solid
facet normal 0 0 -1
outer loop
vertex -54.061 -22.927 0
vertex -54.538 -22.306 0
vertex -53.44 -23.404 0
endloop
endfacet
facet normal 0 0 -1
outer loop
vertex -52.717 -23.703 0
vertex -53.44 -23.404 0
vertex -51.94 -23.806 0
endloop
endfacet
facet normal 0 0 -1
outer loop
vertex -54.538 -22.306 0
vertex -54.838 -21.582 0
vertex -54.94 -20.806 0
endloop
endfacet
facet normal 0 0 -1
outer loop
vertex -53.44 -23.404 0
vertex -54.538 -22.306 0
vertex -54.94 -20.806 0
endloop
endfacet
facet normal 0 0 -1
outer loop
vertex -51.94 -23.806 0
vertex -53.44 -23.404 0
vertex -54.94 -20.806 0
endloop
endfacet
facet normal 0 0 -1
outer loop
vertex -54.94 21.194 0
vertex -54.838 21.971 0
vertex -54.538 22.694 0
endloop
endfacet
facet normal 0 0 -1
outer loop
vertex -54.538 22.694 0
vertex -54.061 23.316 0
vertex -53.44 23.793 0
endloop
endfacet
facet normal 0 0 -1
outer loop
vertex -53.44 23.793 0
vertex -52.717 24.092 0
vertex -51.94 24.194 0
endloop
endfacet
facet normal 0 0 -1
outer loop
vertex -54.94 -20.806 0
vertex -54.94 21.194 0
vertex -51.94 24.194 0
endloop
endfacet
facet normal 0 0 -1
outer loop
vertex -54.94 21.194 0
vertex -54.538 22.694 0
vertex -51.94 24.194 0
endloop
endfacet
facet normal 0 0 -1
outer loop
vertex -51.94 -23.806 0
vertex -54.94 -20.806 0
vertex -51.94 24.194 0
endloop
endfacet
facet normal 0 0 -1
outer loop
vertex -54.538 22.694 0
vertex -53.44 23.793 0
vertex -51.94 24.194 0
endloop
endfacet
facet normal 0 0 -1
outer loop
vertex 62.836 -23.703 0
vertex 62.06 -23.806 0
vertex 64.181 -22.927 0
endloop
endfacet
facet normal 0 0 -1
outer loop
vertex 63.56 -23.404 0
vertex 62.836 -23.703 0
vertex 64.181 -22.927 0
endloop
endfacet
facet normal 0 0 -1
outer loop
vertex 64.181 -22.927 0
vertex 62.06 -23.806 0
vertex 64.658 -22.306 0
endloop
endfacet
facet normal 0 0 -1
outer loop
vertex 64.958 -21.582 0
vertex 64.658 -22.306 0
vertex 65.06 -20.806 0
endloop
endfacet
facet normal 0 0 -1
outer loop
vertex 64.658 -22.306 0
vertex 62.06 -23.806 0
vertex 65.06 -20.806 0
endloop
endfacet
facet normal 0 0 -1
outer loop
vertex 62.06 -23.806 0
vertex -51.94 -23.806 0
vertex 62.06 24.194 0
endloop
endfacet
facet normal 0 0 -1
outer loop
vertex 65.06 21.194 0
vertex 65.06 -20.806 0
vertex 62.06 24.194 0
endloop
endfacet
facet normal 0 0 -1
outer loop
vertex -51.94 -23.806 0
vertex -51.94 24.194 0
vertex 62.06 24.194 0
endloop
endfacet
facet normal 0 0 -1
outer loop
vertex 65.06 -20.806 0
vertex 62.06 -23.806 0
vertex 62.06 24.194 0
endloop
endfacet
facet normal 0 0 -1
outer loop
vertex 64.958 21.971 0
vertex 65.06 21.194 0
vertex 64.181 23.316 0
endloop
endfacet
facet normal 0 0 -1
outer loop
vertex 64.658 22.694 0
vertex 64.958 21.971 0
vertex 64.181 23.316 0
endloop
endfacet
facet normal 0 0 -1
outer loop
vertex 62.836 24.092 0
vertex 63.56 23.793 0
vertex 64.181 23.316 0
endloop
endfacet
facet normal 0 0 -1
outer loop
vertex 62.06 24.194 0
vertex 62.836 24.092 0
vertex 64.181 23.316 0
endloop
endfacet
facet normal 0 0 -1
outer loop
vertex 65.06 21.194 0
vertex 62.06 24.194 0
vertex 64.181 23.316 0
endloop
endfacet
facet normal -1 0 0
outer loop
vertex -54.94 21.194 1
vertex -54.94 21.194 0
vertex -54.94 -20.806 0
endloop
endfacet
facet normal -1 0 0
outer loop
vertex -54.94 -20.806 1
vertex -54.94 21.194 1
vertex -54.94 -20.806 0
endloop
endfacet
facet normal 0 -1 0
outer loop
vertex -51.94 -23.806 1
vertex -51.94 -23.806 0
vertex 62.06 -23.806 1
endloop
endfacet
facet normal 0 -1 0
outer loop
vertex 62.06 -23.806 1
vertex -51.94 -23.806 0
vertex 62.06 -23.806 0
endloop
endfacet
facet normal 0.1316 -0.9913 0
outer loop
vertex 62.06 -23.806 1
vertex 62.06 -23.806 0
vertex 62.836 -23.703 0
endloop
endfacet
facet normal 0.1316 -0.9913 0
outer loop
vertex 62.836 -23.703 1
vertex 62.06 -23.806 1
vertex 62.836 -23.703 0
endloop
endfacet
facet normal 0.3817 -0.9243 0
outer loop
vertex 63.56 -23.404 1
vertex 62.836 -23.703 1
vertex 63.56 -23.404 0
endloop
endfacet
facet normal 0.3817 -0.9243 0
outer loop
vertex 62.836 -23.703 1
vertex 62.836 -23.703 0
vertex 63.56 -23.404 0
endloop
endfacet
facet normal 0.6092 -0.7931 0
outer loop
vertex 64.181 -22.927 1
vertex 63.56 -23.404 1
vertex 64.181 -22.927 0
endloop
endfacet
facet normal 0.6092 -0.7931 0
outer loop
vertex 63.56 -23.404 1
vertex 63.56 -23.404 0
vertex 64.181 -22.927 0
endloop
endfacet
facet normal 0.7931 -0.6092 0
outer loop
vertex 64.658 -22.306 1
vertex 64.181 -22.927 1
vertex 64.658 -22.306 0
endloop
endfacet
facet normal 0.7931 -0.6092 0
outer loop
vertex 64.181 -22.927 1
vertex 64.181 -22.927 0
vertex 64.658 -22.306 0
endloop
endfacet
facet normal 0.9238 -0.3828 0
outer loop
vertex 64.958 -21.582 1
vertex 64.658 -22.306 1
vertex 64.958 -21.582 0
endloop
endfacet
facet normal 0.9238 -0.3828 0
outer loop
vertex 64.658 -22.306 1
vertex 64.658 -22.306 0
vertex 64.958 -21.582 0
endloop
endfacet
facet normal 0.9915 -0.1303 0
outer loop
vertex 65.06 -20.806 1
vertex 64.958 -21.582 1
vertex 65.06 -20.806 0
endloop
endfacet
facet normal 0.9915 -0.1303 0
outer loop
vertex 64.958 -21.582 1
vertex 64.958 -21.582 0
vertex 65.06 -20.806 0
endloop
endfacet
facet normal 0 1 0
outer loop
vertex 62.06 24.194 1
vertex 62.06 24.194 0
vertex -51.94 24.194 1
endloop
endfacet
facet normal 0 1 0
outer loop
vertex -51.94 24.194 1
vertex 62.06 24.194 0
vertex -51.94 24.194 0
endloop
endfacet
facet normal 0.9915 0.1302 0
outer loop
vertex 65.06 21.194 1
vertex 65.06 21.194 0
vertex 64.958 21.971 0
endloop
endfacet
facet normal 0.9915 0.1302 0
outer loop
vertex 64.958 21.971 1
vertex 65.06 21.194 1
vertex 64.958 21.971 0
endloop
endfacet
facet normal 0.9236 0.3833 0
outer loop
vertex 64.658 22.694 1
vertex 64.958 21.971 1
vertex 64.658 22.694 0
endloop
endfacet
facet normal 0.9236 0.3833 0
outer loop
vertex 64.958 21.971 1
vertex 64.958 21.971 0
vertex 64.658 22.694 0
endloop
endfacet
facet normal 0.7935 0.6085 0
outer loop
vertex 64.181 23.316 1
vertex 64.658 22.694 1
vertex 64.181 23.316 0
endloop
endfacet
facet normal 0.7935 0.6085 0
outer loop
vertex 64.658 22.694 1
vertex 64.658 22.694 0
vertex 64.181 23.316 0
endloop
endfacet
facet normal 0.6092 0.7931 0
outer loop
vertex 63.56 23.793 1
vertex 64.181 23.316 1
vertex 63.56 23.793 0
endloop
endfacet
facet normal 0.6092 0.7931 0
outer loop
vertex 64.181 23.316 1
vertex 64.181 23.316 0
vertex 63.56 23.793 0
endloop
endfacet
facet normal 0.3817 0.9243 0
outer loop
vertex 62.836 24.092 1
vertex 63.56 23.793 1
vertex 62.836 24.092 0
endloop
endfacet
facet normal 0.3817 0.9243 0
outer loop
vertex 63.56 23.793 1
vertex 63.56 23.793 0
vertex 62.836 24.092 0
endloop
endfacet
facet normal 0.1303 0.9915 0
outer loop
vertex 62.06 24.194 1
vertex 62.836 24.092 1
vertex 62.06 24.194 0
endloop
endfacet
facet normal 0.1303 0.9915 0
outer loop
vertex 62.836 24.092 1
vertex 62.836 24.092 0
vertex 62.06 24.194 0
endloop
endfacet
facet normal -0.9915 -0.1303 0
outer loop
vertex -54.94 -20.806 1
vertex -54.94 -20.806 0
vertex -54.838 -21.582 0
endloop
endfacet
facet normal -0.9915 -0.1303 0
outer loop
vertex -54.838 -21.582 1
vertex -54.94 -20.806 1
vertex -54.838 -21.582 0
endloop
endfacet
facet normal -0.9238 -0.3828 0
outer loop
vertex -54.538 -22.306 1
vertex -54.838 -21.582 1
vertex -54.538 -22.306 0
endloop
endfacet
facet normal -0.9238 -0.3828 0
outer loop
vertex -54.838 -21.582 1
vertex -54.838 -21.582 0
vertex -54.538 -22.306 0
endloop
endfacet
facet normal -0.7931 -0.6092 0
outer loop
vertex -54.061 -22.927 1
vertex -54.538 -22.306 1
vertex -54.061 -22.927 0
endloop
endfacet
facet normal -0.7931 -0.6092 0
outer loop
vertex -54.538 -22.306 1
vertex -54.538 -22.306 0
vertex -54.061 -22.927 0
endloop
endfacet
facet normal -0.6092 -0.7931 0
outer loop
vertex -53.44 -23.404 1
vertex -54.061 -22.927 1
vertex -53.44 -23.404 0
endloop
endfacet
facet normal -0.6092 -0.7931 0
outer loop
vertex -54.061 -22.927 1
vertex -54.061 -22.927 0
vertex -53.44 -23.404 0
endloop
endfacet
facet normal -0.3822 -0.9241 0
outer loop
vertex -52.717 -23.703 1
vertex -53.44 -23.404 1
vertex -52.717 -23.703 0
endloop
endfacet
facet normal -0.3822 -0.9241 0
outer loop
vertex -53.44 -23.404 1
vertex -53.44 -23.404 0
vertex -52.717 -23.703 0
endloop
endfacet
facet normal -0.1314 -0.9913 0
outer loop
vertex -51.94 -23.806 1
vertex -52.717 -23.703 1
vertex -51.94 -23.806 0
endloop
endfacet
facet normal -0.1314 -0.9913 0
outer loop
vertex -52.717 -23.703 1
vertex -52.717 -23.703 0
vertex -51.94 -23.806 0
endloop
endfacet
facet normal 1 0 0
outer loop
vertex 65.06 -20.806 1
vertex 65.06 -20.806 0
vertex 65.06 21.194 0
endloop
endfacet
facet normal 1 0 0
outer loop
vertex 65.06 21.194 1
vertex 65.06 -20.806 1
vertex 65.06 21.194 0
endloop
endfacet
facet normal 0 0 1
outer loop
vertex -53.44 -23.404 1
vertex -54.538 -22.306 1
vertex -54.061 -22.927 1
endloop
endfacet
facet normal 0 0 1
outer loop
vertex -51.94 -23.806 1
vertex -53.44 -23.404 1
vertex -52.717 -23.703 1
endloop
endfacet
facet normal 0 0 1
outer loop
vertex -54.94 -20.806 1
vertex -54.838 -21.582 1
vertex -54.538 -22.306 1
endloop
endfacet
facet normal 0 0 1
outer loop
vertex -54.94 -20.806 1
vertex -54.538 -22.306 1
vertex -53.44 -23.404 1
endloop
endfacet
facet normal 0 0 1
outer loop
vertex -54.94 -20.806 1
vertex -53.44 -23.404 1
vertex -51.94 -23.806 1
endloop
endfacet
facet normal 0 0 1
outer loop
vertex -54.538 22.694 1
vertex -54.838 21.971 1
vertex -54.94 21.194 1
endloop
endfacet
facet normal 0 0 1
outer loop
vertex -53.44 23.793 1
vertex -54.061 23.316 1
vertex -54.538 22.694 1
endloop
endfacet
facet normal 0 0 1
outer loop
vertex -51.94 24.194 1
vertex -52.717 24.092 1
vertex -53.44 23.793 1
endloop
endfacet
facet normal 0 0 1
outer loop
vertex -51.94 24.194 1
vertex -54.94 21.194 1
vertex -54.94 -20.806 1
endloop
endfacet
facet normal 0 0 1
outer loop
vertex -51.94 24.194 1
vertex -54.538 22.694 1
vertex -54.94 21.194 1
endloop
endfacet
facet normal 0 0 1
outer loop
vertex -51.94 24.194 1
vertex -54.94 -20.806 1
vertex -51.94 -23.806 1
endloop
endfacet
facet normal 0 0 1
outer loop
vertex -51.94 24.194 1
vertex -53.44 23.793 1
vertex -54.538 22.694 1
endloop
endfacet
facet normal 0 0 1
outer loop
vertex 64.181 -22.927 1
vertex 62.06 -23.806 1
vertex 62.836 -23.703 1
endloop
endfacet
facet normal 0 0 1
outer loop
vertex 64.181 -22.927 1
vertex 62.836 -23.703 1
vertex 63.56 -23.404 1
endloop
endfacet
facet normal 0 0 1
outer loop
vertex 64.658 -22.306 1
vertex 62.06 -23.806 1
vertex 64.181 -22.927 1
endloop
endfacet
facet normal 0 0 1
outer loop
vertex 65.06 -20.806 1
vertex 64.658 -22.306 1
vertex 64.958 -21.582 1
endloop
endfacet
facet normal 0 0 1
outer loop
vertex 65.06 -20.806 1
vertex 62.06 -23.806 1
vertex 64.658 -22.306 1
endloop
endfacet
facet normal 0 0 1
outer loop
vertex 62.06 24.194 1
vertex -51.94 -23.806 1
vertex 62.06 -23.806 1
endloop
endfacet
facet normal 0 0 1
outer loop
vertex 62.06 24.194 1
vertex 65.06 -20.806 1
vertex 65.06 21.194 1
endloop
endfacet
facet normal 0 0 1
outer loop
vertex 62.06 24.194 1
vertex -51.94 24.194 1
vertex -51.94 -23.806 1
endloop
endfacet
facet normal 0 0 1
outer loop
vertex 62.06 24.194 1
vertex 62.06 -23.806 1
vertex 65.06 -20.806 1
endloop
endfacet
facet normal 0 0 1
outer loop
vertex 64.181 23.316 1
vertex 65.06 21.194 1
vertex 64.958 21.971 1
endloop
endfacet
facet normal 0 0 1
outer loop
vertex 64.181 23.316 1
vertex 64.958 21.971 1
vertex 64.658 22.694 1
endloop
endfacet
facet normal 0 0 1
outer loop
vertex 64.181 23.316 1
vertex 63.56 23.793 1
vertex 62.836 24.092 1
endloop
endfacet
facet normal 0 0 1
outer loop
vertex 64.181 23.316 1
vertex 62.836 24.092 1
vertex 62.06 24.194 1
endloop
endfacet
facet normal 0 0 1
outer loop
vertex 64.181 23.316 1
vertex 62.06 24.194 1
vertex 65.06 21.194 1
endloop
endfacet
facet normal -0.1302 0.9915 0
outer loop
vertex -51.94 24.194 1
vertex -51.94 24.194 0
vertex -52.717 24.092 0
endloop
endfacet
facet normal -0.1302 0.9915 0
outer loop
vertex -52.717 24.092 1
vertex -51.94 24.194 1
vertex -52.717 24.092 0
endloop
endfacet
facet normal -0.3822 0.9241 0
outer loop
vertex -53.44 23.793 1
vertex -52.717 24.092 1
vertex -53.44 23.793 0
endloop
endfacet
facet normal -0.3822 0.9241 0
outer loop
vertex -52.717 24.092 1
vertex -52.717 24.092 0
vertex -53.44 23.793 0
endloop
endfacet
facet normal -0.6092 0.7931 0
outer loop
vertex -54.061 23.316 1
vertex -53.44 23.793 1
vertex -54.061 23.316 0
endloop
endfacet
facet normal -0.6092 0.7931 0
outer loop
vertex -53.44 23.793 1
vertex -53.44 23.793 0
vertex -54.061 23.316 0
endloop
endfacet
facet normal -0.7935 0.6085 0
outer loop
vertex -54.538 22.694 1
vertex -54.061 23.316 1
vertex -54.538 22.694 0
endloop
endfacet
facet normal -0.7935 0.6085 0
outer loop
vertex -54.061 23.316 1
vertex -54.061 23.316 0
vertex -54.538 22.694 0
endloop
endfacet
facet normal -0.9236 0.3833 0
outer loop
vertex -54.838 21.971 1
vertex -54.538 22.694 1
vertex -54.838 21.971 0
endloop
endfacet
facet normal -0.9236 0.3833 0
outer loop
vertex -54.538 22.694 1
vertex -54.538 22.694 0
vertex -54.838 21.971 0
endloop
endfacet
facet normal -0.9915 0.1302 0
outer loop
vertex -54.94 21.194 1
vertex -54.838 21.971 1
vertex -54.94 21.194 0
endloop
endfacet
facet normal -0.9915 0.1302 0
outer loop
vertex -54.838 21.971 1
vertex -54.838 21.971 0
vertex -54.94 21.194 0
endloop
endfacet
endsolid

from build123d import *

# Parameters (mm, degrees)
BOSS_EXTRUDE1_DEPTH = 1


with BuildPart() as part:
    # Sketch1 → Boss-Extrude1 (new body)
    with BuildSketch(Plane.XY):
        with BuildLine():
            Line((-51.940144553, -23.805569529), (62.059855447, -23.805569529))
            ThreePointArc((62.059855447, -23.805569529), (64.18117579, -22.926889873), (65.059855447, -20.805569529))
            Line((65.059855447, -20.805569529), (65.059855447, 0.194430471))
            Line((65.059855447, 0.194430471), (65.059855447, 21.194430471))
            ThreePointArc((65.059855447, 21.194430471), (64.18117579, 23.315750814), (62.059855447, 24.194430471))
            Line((62.059855447, 24.194430471), (-51.940144553, 24.194430471))
            ThreePointArc((-51.940144553, 24.194430471), (-54.061464897, 23.315750814), (-54.940144553, 21.194430471))
            Line((-54.940144553, 21.194430471), (-54.940144553, 0.194430471))
            Line((-54.940144553, 0.194430471), (-54.940144553, -20.805569529))
            ThreePointArc((-54.940144553, -20.805569529), (-54.061464897, -22.926889873), (-51.940144553, -23.805569529))
        make_face()
    extrude(amount=BOSS_EXTRUDE1_DEPTH)


solid = part.part
